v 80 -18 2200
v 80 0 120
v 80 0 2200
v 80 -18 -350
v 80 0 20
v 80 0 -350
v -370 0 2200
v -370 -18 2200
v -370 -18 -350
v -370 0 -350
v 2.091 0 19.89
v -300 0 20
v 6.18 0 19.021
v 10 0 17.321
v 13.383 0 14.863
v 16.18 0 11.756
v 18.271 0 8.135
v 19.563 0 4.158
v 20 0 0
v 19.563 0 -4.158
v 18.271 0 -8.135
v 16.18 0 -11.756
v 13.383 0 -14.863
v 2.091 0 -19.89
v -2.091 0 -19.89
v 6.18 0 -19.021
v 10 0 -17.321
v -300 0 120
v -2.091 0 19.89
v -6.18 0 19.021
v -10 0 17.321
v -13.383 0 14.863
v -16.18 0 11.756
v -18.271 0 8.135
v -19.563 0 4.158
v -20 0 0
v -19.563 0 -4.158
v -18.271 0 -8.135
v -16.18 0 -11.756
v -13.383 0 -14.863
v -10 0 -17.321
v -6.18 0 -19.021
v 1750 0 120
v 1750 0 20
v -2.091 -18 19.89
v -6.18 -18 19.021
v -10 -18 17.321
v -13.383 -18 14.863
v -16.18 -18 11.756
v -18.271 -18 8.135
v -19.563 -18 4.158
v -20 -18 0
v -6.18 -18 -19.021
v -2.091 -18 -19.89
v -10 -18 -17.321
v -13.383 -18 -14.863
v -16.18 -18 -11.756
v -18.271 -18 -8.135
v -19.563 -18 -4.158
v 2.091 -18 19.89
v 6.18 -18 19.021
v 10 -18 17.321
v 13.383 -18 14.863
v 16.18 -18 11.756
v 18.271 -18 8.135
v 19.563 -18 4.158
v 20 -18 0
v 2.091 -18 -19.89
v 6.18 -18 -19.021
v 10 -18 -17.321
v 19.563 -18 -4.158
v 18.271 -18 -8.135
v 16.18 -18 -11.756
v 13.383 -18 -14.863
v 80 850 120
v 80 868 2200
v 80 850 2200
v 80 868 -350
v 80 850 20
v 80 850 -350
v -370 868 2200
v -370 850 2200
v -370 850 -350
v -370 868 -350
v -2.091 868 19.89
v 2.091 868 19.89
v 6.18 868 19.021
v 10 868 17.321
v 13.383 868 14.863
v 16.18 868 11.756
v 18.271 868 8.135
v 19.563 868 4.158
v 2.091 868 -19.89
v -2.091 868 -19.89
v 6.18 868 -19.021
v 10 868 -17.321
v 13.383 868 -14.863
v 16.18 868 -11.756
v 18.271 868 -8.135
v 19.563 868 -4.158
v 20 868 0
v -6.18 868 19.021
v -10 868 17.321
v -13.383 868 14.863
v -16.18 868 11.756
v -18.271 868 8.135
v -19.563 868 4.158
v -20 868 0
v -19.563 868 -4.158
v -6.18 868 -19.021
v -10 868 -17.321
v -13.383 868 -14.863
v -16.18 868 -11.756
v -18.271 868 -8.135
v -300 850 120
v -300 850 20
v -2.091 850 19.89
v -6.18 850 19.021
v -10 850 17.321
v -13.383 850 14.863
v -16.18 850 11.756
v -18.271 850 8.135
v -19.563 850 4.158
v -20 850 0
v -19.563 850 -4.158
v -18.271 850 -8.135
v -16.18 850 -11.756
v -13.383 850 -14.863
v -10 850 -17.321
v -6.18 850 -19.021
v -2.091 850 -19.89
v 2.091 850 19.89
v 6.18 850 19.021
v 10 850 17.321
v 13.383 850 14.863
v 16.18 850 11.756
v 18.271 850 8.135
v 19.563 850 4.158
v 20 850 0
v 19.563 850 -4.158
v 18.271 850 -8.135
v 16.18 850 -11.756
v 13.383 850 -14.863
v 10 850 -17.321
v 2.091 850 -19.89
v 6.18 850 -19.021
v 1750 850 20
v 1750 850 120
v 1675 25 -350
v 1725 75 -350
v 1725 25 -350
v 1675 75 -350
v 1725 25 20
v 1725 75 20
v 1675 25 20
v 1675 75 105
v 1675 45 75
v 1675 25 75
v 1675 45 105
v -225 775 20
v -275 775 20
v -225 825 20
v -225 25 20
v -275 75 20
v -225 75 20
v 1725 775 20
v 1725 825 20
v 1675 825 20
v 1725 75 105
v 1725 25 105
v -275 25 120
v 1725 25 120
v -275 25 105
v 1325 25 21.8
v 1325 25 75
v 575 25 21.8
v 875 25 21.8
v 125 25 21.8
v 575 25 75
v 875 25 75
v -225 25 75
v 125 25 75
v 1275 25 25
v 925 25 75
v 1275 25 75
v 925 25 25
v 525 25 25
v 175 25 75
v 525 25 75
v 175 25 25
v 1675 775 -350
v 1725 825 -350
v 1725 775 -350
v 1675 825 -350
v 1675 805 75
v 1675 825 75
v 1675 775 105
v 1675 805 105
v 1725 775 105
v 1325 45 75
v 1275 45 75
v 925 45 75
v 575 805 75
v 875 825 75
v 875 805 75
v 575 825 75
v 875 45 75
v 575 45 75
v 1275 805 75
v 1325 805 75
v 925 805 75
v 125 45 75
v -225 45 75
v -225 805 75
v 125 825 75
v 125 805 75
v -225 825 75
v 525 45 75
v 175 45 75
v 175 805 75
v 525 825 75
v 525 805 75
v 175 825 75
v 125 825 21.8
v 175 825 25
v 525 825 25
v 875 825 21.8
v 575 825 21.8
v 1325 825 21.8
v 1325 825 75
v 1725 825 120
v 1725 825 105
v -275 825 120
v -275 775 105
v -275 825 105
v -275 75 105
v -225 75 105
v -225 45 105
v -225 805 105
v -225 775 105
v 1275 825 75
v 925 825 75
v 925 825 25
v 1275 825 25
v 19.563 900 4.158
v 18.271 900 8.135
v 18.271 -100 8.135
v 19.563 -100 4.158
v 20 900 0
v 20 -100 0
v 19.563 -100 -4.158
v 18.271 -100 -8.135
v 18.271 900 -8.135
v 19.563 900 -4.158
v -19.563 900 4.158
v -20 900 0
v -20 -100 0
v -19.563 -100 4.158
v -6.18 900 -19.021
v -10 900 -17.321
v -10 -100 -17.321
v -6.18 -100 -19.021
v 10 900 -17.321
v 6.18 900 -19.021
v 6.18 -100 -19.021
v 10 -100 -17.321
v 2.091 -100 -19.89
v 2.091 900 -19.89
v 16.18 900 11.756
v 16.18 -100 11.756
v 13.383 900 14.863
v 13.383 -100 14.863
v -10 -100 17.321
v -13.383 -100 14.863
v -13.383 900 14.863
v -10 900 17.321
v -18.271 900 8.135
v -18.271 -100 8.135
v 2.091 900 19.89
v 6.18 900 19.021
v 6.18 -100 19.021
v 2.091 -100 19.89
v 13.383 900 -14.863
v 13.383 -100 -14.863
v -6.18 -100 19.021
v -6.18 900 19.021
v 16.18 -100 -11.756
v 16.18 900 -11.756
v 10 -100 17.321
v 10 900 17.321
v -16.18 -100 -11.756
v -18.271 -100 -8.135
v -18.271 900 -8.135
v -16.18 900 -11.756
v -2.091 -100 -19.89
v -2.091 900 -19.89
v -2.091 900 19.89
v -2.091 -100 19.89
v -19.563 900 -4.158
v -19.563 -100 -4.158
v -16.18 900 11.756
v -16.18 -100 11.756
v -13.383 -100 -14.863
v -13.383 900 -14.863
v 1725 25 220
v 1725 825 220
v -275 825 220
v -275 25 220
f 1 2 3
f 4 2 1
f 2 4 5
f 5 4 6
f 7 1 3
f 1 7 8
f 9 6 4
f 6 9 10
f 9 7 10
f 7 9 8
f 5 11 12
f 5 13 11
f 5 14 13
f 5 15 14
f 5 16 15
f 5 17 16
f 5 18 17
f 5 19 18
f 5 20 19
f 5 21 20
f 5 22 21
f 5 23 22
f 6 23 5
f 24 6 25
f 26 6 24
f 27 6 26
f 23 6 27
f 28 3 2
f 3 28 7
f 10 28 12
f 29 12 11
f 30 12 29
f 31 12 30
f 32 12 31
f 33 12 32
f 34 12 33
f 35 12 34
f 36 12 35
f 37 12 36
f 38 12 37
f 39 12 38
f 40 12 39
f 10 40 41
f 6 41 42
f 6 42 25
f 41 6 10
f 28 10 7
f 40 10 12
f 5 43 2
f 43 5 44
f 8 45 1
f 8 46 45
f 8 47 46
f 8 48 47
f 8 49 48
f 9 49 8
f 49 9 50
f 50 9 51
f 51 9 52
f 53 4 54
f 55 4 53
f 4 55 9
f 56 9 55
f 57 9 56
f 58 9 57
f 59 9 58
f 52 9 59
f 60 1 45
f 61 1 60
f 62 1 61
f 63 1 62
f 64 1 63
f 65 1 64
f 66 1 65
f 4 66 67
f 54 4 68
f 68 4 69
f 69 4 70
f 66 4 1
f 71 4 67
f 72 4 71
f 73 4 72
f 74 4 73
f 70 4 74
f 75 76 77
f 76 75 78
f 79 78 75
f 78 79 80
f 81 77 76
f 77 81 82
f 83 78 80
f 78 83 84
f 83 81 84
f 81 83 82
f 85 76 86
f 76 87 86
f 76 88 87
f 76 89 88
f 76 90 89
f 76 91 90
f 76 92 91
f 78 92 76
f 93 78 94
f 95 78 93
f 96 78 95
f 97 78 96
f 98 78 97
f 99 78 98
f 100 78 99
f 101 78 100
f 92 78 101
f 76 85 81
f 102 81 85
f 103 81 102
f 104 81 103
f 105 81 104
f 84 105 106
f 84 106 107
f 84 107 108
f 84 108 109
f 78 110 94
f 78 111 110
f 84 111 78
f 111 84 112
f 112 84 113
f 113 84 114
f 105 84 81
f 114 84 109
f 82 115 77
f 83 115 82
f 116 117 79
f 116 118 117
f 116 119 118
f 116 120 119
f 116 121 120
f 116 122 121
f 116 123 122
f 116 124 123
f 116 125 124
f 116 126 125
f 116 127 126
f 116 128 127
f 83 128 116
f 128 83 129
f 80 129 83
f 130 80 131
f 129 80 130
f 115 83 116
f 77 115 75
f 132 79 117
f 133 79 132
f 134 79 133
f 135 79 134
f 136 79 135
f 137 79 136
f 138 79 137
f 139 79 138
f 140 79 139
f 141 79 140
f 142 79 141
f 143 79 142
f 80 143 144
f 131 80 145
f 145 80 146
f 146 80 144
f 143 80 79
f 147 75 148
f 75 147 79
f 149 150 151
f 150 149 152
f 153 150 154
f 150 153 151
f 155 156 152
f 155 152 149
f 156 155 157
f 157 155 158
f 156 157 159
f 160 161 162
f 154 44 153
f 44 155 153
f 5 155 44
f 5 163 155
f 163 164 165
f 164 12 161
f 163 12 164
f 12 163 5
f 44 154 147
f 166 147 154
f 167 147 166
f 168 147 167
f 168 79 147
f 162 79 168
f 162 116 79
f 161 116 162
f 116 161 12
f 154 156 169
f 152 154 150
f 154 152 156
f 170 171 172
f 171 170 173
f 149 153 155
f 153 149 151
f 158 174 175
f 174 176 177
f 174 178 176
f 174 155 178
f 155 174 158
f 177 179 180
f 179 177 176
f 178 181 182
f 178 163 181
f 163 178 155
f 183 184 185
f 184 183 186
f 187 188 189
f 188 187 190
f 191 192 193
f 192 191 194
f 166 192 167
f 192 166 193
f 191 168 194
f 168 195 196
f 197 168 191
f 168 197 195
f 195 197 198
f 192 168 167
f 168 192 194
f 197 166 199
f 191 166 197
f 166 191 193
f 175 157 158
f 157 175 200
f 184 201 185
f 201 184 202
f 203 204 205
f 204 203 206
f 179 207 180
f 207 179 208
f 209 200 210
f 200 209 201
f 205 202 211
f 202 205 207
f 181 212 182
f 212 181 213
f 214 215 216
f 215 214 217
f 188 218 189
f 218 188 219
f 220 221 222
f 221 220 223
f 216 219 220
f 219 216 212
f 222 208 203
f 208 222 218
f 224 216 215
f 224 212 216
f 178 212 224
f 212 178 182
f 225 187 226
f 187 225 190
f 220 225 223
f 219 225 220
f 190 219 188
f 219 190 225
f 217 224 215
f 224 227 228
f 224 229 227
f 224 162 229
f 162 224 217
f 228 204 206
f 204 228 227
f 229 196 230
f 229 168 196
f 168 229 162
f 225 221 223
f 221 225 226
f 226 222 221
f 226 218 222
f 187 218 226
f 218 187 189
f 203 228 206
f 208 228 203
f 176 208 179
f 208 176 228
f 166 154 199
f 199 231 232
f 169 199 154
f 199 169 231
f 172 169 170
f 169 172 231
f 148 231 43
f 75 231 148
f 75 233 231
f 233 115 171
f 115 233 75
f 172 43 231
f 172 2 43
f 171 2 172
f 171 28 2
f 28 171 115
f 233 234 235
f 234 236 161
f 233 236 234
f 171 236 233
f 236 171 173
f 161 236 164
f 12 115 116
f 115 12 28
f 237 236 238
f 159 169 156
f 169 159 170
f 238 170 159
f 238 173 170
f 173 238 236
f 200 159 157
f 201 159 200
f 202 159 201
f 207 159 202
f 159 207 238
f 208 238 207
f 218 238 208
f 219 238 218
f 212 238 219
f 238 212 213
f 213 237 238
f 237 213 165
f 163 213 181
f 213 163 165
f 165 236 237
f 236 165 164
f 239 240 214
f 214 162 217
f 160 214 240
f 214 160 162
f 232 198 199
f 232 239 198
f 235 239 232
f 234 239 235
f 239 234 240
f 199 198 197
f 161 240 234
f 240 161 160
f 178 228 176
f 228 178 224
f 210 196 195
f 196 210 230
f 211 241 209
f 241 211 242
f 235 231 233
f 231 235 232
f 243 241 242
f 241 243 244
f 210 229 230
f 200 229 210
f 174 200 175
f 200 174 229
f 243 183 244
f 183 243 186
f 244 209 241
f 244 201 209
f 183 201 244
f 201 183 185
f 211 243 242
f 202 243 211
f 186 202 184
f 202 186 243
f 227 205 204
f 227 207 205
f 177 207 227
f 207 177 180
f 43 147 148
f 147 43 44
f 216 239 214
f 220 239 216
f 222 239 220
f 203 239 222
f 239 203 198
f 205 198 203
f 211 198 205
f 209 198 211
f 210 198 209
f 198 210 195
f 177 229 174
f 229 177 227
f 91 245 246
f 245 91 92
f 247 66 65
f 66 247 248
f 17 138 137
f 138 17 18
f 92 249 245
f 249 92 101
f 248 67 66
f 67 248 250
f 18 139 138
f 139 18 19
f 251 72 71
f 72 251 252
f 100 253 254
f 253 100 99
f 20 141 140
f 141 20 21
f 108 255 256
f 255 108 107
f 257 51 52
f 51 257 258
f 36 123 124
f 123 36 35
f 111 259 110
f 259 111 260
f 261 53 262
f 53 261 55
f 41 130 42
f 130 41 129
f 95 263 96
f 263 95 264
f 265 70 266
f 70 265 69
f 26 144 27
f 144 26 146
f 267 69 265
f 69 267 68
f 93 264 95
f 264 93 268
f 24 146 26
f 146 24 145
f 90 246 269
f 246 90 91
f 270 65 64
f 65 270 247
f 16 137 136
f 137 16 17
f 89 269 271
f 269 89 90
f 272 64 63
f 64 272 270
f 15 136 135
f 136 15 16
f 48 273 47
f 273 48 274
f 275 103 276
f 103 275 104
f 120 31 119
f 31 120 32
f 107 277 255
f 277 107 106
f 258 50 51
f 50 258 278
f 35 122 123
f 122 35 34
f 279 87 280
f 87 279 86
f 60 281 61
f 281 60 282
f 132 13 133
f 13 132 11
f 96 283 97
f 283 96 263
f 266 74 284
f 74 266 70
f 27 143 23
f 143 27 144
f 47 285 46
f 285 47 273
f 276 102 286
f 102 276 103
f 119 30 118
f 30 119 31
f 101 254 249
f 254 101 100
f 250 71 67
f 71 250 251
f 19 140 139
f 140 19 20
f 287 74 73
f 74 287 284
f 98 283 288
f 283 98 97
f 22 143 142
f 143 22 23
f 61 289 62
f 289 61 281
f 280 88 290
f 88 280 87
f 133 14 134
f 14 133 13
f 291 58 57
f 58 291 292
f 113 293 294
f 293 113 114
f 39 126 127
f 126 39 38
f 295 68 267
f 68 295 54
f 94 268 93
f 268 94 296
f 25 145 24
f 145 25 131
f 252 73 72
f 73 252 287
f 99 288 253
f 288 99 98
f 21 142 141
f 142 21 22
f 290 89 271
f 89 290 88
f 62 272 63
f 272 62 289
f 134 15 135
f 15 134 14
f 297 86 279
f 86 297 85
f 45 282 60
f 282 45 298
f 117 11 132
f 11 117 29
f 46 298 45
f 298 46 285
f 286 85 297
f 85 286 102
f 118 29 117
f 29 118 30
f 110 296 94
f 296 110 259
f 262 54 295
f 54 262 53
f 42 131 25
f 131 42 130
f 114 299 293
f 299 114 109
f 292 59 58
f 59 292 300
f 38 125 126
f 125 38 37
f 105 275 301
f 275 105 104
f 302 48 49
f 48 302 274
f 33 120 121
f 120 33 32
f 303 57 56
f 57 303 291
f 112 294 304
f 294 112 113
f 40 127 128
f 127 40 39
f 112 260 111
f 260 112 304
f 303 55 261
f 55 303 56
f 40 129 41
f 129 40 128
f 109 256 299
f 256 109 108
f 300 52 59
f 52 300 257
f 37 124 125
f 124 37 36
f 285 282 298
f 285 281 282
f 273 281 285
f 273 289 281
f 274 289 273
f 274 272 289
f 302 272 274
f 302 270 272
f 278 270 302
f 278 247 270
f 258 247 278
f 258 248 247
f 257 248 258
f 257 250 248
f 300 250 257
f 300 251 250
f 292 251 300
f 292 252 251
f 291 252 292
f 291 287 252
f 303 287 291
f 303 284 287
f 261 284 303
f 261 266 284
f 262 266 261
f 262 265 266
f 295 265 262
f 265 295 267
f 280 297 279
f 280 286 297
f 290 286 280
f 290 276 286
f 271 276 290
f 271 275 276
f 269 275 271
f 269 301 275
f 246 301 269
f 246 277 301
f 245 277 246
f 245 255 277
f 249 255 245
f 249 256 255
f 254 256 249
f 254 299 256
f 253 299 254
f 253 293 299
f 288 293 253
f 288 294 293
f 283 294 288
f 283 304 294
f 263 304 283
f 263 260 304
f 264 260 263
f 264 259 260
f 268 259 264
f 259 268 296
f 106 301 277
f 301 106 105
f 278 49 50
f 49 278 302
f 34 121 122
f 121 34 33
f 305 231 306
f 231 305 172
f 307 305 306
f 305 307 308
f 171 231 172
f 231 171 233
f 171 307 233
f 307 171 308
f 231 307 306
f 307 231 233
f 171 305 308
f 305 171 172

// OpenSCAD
// My dictionary of this project
	// length (or Y-axis size) = L;
	// width (or X-axis size) = W;
	// hight (or Z-axis size) = H;

	// X-axis shift = dX (from windom to door);
	// Y-axis shift = dY (view the window from right to left);
	// Z-axis shift = dZ (from floor to ceiling);

	// color = clr;

	// Room = RM; wall = w; window = WD; door = DR;
	// windowsill = WS; radiator = RDR;
	
	// BookShelf = BS; shelf = s; rack = r;
	// Bad = BD; desk = DSK;
	x = -370;
	y = -268;
	z = -350;

	
//====================================================
// draw BookShelfs
	// narrow shelf = N; wide shelf = W;
	// sizes	
		N = 225; W = 450;

		// BS03 - between bads;
		// BS03_l and BS03_r - bad as BS (rack without selves) 
		r_BS_clr = "lightyellow";
		s_BS_clr = "violet";
		desk_thick = 18;

		BD_W = 850;

		// BS03_l
		BS03_l_L = BD_W; BS03_l_W = W;
		s_BS03_l_H = [];
		r_BS03_l_H = [2550, 2550];
		BS03_l_di = [0, 250, 0]; // dX, dY, dZ
		length_BS03_l = BS03_l_L + (r_BS03_l_H[0] == 0 ? 0 : desk_thick) + (r_BS03_l_H[1] == 0 ? 0 : desk_thick);
		//echo(length_BS03_l);

		
	module BS_draw(BS_W, s_BS_L, s_BS_H, r_BS_H, BS_di, angle){
		rotate([0,0,angle]){
			translate(BS_di){
			    for(j=[0, 2, 1]){
			        if(j<2){
			            ds = r_BS_H[0] == 0 ? 0 : desk_thick;
			            translate([0,(s_BS_L+ds)*j,0])
			            color(r_BS_clr, 1)
			            cube([BS_W, desk_thick, r_BS_H[j]]);}
			        else{
				        for(h=s_BS_H){
				    		ds = r_BS_H[0] == 0 ? 0 : desk_thick;
				    		translate([0,ds,h-desk_thick])
				        	shelf_draw(BS_W, s_BS_L);}}}}}}

	module shelf_draw(BS_W, s_BS_L){
	    color(s_BS_clr, 1)
	    cube([BS_W, s_BS_L, desk_thick]);}

	// draw all BookShelfs
		translate([x,y,z]){

		BS_draw(BS03_l_W, BS03_l_L, s_BS03_l_H, r_BS03_l_H, BS03_l_di);
		}
	
	
//====================================================
// DRAW BED
	{// My dictionary of this project
		// length (or Y-axis size) = L;
		// width (or X-axis size) = W;
		// hight (or Z-axis size) = H;

		// X-axis shift = dX (from windom to door);
		// Y-axis shift = dY (view the window from right to left);
		// Z-axis shift = dZ (from floor to ceiling);

		// color = clr;

		// side part =
		//			SPi for inner;
		//			SPo for outer;
		//			SPt for transverse;
		// plywood = PW; Bad = BD;
		
	//====================================================
	// draw outer side part

		SPo_clr = "yellow";
		SPo_W = 25;
		SPo_H = 100;
		SPo_L = 2000;

		module SPo_draw(length){
			color(SPo_clr, 1)
			cube([length, SPo_W, SPo_H]);}
		module SPo_draw_green(length){
			color("green", 1)
			cube([length, SPo_W, SPo_H]);}

	//====================================================
	// draw inner side part

		SPi_clr = "orange";
		SPi_W = 20;
		SPi_H = 30;
		SPi_L = SPo_L;

		module SPi_draw(length){
			color(SPi_clr, 1)
			cube([length, SPi_W, SPi_H]);}

	//====================================================
	// draw transverse side part

		SPt_clr = "blue";
		SPt_W = 50;
		SPt_H = 50;
		SPt_L = 800;

		module SPt_draw(length){
			color(SPt_clr, 1)
			cube([length, SPt_W, SPt_H]);}

	//====================================================
	// draw one plywood

		PW_clr = "red";
		PW_H = 3.2;
		PW_W = 800;
		PW_L = 450;

		module PW_draw(length, width){
			color(PW_clr, 1)
			cube([length, width, PW_H]);}

	//====================================================
	// draw bad
		/*
		l2_1 - 365
		длина ножки от верхней кромки упора для ортопедического основания
		l2_1 - 715
		длина уголка от верхней кромки упора для ортопедического основания
		l2_1 = SPt_L
		SPt_L = 800
		ОСЬ вращение:
			на КРОВАТИ	== 300мм от изголовья

			на СТОЙКЕ	== 350мм от стены
			ВЫСОТА		== 350мм от пола
		*/

		// draw 1/2 frame
			module piece_1_BD_draw(){

				l1 = SPo_L;
				l2 = SPt_L + 2 * SPo_W;
				l2_1 = SPt_L;
				l3 = SPi_L;

				// draw outer detail
					translate([SPo_W, 0, 0])
						SPo_draw(l1);
				
				// draw transverse outer detail
					translate([SPo_W, 0, 0])
						rotate([0, 0, 90])
							SPo_draw_green(l2);

				// draw inner detail
					translate([SPo_W, SPo_W, SPo_H - SPi_H - 15])
						SPi_draw(l3);

				// draw transverse details
					for (i=[1:2]){
						translate([SPt_W + SPo_W + i * 400, SPo_W, 5])
							rotate([0, 0, 90])
								SPt_draw(l2_1);}

				// draw corner details
					translate([SPt_W + SPo_W - 50, SPo_W, 85])
							rotate([0, 90, 0])
								SPt_draw(l2_1 - 715);
					translate([SPt_W + SPo_W - 50, SPo_W + 750, 85])
							rotate([0, 90, 0])
								SPt_draw(l2_1 - 715);

				// draw 1/2 plywood
					x = PW_L;
					y = PW_W;
					translate([SPo_W + 400, SPo_W, 5 - PW_H])
						PW_draw(x, y);}

		// draw mattress

			module mattress(){
				L_m = 2000;
				H_m = 100;
				W_m = 800;
				clr_m = "pink";
				translate([SPo_W, SPo_W, SPo_H])
					color(clr_m, 1)
						cube([L_m, W_m, H_m]);}}

		module bed_self(){
			// draw axis
				color("brown", 1)
					translate([300,400,-20])
						rotate([90,0,0])
							cylinder(r=20, h=1000, center=true);

			// draw legs
				color("brown", 1){
					translate([SPt_W + SPo_W - 100 + 2000, SPo_W, 0])
						rotate([0, 90, 0])
							SPt_draw(SPt_L - 430);
					translate([SPt_W + SPo_W - 100 + 2000, SPo_W + 750, 0])
						rotate([0, 90, 0])
							SPt_draw(SPt_L - 430);}

			mattress();
			
			piece_1_BD_draw();
			
			translate([2000 + 2 * SPo_W, 800 + 2 * SPo_W, 0])
				rotate([0,0,180])
						piece_1_BD_draw();}
		
//====================================================
// TURN ANIMATION
//rotate([0, -$t*90, 0])
	rotate([0, -$t*90, 0])
		translate([-300, 0, 20])
			bed_self();
